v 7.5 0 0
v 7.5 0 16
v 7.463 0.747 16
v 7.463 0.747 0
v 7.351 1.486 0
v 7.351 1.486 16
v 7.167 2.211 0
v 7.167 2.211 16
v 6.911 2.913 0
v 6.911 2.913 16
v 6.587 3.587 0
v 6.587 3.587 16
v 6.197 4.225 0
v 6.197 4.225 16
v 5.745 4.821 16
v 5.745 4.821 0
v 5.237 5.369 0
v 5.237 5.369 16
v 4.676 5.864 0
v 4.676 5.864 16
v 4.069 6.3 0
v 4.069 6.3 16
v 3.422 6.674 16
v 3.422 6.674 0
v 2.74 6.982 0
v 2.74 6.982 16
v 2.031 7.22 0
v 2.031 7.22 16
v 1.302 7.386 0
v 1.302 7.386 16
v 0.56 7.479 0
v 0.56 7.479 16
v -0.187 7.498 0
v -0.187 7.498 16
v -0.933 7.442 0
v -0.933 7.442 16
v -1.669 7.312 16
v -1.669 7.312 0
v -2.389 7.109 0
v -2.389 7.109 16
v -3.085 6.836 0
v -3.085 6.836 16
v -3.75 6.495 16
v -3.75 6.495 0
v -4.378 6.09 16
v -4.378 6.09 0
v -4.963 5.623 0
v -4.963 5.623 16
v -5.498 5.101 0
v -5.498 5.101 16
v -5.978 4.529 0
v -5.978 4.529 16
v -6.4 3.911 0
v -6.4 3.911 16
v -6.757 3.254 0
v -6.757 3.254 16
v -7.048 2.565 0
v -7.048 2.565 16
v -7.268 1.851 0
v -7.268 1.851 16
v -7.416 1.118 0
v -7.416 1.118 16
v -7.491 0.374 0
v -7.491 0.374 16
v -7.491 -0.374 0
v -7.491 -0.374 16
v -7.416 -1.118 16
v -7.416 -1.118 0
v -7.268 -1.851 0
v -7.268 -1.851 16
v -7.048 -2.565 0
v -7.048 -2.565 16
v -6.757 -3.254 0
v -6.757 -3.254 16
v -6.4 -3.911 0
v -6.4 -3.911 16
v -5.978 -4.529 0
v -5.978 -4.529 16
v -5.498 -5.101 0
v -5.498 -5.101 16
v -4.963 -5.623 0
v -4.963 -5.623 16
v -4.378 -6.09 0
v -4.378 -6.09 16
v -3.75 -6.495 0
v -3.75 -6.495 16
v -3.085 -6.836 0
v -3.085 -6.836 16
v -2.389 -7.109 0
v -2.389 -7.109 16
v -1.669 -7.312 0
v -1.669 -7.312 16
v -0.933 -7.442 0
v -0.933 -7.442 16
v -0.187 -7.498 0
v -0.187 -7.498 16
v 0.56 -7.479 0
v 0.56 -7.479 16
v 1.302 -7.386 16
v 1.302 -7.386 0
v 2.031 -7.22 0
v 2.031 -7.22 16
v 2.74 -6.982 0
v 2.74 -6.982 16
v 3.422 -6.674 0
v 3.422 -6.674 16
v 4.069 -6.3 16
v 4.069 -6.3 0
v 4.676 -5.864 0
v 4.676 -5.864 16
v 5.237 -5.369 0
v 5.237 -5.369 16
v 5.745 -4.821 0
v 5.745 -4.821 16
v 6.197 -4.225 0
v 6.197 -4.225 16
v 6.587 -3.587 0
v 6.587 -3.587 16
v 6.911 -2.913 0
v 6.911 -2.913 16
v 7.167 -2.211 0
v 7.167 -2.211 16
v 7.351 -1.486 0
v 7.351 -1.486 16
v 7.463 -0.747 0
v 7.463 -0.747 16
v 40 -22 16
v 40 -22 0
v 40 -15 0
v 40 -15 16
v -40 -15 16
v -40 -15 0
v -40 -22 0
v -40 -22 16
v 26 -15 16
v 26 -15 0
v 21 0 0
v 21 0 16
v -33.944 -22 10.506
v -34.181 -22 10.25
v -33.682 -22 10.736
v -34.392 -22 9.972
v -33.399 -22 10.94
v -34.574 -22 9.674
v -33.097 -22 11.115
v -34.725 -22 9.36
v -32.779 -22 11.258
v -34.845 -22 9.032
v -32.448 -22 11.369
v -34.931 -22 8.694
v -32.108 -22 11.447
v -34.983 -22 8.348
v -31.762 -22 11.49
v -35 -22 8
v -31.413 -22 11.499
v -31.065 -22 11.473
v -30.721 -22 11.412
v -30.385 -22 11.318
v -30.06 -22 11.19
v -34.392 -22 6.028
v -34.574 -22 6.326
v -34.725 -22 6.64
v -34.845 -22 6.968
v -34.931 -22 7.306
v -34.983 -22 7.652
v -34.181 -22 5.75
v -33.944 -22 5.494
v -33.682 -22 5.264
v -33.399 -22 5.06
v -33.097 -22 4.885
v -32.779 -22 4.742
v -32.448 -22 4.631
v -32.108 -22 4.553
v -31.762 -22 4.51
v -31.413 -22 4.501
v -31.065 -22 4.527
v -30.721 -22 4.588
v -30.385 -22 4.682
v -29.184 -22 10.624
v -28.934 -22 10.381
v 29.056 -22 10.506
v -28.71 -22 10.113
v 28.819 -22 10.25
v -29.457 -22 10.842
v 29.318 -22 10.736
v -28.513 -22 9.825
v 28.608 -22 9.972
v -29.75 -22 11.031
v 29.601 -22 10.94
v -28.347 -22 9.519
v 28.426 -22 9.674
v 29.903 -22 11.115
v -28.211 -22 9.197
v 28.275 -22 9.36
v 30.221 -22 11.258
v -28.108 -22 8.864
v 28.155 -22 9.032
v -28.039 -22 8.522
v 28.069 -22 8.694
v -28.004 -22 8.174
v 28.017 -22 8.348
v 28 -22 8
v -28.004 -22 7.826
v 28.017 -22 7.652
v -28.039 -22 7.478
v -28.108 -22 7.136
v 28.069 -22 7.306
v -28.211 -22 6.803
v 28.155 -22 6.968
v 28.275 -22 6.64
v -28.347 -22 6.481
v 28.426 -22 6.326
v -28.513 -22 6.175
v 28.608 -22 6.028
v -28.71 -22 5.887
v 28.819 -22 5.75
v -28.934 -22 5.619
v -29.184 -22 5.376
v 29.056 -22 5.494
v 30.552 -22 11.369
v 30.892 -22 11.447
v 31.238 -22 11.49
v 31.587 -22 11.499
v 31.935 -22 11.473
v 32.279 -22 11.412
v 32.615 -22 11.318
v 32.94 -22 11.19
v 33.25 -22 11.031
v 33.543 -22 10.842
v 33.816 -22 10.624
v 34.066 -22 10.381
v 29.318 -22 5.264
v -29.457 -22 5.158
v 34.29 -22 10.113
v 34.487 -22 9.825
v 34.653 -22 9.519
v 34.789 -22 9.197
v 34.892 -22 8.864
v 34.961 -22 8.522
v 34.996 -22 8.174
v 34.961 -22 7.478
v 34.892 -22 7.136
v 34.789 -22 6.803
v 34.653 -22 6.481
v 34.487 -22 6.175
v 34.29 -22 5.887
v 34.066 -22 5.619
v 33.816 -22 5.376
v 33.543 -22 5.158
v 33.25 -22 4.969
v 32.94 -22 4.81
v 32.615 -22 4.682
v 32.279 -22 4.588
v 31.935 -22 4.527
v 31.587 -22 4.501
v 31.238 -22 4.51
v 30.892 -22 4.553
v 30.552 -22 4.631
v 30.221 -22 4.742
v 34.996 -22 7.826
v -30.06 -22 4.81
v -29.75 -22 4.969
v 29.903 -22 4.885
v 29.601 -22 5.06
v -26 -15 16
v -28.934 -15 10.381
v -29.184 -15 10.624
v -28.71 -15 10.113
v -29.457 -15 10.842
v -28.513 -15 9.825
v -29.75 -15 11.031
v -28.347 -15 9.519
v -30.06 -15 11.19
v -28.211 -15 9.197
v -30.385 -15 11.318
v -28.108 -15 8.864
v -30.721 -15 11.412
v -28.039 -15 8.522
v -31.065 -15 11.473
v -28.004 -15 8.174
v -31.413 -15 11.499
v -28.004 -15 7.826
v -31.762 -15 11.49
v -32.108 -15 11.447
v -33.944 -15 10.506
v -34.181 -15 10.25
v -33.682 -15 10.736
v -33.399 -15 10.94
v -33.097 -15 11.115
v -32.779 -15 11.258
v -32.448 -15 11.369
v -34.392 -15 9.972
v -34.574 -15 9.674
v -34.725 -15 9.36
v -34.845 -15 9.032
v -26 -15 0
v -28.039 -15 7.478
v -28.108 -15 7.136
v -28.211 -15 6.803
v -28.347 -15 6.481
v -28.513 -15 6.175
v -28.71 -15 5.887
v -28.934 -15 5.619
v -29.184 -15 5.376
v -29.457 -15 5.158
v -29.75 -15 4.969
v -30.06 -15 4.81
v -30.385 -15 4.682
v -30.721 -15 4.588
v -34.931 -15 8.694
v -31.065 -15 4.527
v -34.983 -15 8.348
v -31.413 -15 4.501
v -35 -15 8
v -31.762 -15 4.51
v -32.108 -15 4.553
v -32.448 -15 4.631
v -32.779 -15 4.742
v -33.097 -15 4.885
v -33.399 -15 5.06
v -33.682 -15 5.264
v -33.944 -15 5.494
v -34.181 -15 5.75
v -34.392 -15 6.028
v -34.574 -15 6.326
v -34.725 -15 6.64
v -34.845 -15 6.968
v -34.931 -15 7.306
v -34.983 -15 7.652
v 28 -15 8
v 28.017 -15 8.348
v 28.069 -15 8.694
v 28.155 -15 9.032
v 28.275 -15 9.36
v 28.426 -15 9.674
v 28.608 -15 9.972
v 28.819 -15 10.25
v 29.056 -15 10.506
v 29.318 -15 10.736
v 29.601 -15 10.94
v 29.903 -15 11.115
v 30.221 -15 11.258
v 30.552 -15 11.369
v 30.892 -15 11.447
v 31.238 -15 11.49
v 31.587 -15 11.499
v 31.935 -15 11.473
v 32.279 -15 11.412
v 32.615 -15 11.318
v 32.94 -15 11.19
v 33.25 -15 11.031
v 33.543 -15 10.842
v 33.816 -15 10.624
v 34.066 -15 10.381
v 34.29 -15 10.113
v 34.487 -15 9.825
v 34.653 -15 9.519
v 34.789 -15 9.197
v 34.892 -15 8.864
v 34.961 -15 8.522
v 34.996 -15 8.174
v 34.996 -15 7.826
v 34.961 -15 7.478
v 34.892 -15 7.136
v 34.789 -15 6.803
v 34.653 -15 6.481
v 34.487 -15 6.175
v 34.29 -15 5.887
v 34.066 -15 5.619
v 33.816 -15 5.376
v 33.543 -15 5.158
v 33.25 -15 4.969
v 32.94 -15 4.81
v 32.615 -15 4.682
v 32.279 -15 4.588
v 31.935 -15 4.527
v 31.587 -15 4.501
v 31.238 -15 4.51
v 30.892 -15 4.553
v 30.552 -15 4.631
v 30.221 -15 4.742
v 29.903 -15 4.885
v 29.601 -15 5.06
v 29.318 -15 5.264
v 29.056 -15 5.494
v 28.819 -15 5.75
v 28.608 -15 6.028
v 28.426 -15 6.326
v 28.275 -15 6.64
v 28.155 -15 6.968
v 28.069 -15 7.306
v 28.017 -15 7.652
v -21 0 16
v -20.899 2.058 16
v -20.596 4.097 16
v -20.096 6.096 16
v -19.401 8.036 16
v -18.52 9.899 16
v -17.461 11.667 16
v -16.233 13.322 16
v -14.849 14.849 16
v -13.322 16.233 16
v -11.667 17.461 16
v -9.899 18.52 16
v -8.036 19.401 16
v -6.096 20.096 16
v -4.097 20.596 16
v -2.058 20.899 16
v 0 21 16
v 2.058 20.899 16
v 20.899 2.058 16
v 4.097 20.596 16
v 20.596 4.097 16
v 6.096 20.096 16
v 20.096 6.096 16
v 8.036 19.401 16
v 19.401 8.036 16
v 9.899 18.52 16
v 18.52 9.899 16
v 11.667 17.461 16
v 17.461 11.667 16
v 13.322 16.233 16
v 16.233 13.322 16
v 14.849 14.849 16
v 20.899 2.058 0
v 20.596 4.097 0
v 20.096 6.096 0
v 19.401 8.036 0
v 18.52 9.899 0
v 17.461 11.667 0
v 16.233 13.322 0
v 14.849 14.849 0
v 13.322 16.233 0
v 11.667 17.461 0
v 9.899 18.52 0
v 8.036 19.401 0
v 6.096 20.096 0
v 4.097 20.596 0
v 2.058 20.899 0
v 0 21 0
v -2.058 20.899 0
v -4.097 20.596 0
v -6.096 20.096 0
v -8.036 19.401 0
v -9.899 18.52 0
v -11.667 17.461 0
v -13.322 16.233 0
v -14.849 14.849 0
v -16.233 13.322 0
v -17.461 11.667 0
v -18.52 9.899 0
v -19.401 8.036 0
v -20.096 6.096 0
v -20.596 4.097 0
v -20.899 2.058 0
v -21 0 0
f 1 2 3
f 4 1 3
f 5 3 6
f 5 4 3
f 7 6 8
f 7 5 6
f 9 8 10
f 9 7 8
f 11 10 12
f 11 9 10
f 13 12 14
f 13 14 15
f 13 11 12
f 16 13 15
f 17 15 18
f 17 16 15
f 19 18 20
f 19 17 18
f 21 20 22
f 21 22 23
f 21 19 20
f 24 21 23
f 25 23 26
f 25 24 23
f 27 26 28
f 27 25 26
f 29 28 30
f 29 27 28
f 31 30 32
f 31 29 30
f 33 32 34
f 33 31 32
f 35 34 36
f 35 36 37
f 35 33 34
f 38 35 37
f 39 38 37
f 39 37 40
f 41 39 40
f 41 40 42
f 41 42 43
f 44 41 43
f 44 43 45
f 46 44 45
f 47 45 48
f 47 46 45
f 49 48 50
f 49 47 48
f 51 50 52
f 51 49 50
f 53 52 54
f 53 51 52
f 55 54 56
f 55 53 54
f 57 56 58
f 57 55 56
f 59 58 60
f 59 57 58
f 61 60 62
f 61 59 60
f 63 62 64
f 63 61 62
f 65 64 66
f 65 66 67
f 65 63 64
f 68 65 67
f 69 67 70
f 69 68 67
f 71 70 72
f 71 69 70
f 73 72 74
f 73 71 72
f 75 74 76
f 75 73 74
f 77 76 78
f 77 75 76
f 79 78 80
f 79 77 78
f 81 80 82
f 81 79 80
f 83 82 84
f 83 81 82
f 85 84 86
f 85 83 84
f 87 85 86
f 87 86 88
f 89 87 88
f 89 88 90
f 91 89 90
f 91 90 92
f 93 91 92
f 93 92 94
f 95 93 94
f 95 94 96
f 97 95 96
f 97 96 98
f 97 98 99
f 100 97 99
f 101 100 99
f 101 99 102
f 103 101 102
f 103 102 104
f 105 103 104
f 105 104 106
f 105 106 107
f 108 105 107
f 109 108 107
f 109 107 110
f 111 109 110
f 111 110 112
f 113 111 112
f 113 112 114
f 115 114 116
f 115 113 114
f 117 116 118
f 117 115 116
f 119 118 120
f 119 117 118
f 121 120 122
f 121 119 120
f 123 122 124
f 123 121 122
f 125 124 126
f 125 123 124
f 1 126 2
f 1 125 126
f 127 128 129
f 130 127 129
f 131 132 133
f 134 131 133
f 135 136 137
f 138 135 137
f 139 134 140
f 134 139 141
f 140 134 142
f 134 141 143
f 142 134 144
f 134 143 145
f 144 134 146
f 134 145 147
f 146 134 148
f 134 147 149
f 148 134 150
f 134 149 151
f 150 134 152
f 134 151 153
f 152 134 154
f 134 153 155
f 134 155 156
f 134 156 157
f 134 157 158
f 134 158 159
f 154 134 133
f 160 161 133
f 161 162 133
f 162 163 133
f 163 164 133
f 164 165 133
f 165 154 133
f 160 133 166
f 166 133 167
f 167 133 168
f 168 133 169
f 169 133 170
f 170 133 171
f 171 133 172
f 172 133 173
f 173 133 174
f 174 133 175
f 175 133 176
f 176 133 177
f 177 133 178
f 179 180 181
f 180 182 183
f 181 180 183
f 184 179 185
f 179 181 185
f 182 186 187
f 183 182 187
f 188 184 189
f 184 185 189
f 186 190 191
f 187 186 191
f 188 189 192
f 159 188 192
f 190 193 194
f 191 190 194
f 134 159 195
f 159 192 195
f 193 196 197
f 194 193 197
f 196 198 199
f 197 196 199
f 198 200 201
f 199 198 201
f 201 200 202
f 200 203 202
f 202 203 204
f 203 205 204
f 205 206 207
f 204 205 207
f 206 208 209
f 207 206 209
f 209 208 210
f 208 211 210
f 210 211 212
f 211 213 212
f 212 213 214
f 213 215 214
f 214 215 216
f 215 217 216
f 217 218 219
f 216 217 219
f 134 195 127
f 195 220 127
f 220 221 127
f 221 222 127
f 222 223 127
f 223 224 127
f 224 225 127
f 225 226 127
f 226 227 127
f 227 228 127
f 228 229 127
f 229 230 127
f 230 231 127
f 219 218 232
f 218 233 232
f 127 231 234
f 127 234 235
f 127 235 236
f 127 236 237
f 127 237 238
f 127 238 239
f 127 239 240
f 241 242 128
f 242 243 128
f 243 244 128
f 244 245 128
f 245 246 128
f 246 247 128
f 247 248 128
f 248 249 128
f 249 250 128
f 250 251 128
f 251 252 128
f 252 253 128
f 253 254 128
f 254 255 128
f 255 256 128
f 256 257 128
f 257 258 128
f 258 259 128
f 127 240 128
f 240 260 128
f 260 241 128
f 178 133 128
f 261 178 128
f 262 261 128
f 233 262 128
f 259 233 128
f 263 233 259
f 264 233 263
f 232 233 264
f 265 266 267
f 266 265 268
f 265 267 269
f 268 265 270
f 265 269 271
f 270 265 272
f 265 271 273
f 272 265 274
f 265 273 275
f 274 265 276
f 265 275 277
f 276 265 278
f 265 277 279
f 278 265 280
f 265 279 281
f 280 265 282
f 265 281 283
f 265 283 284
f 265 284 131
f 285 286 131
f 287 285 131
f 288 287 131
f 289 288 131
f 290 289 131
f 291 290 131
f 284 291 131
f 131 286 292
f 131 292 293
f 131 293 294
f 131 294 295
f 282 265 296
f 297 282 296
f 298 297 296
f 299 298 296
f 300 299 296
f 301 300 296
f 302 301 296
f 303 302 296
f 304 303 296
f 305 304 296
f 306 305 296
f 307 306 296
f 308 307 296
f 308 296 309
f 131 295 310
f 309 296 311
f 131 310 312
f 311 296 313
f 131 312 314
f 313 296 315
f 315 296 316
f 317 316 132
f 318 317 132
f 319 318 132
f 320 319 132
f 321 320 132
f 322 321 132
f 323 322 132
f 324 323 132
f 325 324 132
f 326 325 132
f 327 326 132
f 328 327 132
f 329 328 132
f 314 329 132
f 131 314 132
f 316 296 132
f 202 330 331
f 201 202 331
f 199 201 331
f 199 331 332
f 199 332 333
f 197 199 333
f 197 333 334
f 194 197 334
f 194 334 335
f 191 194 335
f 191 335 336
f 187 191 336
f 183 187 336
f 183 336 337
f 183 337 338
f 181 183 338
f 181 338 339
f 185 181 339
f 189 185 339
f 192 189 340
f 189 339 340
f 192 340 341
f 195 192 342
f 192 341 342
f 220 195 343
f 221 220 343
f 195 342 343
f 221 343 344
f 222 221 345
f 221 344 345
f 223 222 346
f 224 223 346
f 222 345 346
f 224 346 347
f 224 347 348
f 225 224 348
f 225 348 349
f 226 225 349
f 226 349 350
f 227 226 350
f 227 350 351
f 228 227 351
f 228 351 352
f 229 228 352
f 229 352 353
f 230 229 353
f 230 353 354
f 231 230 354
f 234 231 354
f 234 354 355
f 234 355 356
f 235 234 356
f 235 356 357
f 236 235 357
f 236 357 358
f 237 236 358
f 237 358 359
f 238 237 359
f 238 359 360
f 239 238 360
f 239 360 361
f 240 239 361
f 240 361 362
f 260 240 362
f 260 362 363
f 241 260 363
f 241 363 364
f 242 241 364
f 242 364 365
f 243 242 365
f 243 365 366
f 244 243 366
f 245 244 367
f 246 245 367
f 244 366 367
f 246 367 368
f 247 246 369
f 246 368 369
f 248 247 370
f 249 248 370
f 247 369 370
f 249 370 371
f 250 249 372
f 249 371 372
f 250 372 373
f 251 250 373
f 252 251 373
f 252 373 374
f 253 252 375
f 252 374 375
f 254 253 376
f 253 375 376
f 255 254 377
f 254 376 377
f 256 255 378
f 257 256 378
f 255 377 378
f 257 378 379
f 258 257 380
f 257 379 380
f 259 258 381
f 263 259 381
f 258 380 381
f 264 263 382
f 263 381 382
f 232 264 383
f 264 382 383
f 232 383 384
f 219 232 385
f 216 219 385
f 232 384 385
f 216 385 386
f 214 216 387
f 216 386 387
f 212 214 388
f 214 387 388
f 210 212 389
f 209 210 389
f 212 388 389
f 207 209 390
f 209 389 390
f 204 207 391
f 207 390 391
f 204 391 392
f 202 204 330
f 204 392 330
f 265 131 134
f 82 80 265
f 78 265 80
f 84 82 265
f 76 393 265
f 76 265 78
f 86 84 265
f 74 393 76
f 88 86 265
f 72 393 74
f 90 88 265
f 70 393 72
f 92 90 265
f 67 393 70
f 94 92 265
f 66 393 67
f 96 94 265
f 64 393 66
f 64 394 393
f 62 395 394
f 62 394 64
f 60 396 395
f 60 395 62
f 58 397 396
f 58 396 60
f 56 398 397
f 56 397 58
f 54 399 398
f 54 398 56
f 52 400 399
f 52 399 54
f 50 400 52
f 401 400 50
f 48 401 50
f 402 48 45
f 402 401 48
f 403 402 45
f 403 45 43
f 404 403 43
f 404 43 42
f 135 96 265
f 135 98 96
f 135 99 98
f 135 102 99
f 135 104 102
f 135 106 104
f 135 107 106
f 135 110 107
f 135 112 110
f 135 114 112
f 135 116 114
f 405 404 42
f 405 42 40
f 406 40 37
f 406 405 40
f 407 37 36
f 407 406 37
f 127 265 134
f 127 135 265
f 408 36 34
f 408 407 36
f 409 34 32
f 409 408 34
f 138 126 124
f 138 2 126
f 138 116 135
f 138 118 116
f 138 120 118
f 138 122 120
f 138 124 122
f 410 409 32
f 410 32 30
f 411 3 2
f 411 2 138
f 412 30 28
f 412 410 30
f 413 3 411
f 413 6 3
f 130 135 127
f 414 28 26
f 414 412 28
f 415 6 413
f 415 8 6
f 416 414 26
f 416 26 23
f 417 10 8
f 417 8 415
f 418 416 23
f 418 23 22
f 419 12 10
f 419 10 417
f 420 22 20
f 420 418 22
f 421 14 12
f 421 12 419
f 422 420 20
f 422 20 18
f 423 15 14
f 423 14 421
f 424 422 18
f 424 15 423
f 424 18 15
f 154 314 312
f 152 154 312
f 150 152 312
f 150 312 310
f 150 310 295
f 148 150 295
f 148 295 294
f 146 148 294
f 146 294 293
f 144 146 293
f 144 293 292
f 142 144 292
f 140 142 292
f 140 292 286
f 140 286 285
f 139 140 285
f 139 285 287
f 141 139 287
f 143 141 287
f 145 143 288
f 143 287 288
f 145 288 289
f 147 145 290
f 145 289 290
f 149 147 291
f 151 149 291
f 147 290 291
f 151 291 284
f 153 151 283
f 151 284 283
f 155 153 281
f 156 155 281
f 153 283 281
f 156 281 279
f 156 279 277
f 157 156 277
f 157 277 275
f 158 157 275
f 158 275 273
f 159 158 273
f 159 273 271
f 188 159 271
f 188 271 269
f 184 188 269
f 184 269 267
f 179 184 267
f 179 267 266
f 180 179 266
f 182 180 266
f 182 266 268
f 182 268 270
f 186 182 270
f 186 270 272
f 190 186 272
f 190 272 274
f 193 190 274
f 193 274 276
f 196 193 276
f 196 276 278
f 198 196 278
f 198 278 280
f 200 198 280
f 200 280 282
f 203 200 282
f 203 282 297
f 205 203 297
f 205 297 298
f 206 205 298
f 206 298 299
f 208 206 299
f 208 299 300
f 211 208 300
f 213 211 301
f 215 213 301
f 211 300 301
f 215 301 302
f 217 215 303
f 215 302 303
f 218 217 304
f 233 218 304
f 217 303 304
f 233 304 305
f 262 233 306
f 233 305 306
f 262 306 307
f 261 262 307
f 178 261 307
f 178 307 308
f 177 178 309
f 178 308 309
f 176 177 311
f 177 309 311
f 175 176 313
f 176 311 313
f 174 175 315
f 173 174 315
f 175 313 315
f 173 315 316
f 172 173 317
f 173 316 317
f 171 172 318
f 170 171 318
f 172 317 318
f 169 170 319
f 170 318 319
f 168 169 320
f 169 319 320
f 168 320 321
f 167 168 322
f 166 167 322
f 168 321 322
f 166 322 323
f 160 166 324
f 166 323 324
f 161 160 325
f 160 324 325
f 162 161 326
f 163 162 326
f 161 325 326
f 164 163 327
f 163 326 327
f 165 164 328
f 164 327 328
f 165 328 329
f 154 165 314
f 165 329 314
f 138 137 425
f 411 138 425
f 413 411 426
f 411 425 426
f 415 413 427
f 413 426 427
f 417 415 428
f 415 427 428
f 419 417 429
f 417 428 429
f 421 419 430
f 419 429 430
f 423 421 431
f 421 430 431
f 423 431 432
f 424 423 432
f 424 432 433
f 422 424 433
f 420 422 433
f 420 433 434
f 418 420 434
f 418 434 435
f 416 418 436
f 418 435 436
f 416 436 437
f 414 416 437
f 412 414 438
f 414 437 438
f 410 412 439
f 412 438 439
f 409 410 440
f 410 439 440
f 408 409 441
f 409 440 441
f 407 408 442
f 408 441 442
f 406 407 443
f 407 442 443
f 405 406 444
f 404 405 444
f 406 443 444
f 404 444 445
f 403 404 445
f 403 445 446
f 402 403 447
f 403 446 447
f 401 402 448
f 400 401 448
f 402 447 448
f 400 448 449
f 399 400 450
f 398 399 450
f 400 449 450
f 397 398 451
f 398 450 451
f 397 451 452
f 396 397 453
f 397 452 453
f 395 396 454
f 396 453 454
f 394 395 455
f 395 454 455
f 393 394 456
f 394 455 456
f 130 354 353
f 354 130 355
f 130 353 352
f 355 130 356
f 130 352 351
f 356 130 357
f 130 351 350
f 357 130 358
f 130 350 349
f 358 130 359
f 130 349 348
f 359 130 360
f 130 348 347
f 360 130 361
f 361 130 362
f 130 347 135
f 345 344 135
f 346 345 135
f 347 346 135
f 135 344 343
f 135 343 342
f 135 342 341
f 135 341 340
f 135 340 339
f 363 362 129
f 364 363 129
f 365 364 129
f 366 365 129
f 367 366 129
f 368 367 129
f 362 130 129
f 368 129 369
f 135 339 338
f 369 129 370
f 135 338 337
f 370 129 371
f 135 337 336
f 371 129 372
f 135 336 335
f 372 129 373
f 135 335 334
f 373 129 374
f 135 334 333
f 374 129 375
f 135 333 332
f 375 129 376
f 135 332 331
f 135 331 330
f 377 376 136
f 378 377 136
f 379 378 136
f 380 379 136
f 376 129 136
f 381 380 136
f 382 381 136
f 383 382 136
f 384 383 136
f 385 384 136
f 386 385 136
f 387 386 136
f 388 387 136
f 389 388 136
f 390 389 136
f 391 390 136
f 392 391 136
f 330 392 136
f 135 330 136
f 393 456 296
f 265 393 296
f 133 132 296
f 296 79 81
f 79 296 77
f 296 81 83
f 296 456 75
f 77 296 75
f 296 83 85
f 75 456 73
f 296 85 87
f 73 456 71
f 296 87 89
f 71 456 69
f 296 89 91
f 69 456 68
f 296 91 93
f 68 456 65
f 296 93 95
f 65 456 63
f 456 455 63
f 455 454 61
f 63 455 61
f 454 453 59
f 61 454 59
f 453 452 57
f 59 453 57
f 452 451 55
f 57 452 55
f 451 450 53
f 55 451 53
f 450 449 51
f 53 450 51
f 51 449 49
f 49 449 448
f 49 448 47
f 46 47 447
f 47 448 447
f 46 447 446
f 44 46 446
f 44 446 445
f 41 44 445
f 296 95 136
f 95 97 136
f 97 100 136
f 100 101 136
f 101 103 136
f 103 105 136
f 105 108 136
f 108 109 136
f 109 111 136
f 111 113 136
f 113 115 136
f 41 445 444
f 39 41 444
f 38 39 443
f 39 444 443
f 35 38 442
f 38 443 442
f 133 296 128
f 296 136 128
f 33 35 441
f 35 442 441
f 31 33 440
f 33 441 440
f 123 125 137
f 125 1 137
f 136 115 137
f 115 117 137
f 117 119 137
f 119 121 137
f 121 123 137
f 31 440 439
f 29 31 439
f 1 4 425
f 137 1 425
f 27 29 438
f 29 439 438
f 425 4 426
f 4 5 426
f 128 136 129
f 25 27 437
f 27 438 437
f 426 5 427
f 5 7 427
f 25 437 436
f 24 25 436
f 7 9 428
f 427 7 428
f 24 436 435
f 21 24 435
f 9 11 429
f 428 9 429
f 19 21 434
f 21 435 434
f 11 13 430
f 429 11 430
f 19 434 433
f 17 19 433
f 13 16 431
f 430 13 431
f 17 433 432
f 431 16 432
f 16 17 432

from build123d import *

# Parameters (mm, degrees)
SKETCH_1_R          = 7.5
EXTRUDE_1_DEPTH     = 16
SKETCH_3_R          = 3.5
CUT_EXTRUDE_1_DEPTH = 57.14267539


with BuildPart() as part:
    # 草图1 → 凸台-拉伸1 (new body)
    with BuildSketch(Plane.XY):
        with BuildLine():
            Line((-21, 0), (-26, -15))
            Line((-26, -15), (-40, -15))
            Line((-40, -15), (-40, -22))
            Line((-40, -22), (40, -22))
            Line((40, -22), (40, -15))
            Line((40, -15), (26, -15))
            Line((26, -15), (21, 0))
            ThreePointArc((21, 0), (0, 21), (-21, 0))
        make_face()
        Circle(SKETCH_1_R, mode=Mode.SUBTRACT)
    extrude(amount=EXTRUDE_1_DEPTH)

    # 草图3 → 切除-拉伸1 (cut, through all)
    with BuildSketch(Plane(origin=(0, -15, 0), x_dir=(1, 0, 0), z_dir=(0, 1, 0))):
        with Locations(Location((-31.5, -8, 0), (0, 0, 180))):
            Circle(SKETCH_3_R)
        with Locations(Location((31.5, -8, 0), (0, 0, 180))):
            Circle(SKETCH_3_R)
    extrude(amount=-CUT_EXTRUDE_1_DEPTH, mode=Mode.SUBTRACT)


solid = part.part
